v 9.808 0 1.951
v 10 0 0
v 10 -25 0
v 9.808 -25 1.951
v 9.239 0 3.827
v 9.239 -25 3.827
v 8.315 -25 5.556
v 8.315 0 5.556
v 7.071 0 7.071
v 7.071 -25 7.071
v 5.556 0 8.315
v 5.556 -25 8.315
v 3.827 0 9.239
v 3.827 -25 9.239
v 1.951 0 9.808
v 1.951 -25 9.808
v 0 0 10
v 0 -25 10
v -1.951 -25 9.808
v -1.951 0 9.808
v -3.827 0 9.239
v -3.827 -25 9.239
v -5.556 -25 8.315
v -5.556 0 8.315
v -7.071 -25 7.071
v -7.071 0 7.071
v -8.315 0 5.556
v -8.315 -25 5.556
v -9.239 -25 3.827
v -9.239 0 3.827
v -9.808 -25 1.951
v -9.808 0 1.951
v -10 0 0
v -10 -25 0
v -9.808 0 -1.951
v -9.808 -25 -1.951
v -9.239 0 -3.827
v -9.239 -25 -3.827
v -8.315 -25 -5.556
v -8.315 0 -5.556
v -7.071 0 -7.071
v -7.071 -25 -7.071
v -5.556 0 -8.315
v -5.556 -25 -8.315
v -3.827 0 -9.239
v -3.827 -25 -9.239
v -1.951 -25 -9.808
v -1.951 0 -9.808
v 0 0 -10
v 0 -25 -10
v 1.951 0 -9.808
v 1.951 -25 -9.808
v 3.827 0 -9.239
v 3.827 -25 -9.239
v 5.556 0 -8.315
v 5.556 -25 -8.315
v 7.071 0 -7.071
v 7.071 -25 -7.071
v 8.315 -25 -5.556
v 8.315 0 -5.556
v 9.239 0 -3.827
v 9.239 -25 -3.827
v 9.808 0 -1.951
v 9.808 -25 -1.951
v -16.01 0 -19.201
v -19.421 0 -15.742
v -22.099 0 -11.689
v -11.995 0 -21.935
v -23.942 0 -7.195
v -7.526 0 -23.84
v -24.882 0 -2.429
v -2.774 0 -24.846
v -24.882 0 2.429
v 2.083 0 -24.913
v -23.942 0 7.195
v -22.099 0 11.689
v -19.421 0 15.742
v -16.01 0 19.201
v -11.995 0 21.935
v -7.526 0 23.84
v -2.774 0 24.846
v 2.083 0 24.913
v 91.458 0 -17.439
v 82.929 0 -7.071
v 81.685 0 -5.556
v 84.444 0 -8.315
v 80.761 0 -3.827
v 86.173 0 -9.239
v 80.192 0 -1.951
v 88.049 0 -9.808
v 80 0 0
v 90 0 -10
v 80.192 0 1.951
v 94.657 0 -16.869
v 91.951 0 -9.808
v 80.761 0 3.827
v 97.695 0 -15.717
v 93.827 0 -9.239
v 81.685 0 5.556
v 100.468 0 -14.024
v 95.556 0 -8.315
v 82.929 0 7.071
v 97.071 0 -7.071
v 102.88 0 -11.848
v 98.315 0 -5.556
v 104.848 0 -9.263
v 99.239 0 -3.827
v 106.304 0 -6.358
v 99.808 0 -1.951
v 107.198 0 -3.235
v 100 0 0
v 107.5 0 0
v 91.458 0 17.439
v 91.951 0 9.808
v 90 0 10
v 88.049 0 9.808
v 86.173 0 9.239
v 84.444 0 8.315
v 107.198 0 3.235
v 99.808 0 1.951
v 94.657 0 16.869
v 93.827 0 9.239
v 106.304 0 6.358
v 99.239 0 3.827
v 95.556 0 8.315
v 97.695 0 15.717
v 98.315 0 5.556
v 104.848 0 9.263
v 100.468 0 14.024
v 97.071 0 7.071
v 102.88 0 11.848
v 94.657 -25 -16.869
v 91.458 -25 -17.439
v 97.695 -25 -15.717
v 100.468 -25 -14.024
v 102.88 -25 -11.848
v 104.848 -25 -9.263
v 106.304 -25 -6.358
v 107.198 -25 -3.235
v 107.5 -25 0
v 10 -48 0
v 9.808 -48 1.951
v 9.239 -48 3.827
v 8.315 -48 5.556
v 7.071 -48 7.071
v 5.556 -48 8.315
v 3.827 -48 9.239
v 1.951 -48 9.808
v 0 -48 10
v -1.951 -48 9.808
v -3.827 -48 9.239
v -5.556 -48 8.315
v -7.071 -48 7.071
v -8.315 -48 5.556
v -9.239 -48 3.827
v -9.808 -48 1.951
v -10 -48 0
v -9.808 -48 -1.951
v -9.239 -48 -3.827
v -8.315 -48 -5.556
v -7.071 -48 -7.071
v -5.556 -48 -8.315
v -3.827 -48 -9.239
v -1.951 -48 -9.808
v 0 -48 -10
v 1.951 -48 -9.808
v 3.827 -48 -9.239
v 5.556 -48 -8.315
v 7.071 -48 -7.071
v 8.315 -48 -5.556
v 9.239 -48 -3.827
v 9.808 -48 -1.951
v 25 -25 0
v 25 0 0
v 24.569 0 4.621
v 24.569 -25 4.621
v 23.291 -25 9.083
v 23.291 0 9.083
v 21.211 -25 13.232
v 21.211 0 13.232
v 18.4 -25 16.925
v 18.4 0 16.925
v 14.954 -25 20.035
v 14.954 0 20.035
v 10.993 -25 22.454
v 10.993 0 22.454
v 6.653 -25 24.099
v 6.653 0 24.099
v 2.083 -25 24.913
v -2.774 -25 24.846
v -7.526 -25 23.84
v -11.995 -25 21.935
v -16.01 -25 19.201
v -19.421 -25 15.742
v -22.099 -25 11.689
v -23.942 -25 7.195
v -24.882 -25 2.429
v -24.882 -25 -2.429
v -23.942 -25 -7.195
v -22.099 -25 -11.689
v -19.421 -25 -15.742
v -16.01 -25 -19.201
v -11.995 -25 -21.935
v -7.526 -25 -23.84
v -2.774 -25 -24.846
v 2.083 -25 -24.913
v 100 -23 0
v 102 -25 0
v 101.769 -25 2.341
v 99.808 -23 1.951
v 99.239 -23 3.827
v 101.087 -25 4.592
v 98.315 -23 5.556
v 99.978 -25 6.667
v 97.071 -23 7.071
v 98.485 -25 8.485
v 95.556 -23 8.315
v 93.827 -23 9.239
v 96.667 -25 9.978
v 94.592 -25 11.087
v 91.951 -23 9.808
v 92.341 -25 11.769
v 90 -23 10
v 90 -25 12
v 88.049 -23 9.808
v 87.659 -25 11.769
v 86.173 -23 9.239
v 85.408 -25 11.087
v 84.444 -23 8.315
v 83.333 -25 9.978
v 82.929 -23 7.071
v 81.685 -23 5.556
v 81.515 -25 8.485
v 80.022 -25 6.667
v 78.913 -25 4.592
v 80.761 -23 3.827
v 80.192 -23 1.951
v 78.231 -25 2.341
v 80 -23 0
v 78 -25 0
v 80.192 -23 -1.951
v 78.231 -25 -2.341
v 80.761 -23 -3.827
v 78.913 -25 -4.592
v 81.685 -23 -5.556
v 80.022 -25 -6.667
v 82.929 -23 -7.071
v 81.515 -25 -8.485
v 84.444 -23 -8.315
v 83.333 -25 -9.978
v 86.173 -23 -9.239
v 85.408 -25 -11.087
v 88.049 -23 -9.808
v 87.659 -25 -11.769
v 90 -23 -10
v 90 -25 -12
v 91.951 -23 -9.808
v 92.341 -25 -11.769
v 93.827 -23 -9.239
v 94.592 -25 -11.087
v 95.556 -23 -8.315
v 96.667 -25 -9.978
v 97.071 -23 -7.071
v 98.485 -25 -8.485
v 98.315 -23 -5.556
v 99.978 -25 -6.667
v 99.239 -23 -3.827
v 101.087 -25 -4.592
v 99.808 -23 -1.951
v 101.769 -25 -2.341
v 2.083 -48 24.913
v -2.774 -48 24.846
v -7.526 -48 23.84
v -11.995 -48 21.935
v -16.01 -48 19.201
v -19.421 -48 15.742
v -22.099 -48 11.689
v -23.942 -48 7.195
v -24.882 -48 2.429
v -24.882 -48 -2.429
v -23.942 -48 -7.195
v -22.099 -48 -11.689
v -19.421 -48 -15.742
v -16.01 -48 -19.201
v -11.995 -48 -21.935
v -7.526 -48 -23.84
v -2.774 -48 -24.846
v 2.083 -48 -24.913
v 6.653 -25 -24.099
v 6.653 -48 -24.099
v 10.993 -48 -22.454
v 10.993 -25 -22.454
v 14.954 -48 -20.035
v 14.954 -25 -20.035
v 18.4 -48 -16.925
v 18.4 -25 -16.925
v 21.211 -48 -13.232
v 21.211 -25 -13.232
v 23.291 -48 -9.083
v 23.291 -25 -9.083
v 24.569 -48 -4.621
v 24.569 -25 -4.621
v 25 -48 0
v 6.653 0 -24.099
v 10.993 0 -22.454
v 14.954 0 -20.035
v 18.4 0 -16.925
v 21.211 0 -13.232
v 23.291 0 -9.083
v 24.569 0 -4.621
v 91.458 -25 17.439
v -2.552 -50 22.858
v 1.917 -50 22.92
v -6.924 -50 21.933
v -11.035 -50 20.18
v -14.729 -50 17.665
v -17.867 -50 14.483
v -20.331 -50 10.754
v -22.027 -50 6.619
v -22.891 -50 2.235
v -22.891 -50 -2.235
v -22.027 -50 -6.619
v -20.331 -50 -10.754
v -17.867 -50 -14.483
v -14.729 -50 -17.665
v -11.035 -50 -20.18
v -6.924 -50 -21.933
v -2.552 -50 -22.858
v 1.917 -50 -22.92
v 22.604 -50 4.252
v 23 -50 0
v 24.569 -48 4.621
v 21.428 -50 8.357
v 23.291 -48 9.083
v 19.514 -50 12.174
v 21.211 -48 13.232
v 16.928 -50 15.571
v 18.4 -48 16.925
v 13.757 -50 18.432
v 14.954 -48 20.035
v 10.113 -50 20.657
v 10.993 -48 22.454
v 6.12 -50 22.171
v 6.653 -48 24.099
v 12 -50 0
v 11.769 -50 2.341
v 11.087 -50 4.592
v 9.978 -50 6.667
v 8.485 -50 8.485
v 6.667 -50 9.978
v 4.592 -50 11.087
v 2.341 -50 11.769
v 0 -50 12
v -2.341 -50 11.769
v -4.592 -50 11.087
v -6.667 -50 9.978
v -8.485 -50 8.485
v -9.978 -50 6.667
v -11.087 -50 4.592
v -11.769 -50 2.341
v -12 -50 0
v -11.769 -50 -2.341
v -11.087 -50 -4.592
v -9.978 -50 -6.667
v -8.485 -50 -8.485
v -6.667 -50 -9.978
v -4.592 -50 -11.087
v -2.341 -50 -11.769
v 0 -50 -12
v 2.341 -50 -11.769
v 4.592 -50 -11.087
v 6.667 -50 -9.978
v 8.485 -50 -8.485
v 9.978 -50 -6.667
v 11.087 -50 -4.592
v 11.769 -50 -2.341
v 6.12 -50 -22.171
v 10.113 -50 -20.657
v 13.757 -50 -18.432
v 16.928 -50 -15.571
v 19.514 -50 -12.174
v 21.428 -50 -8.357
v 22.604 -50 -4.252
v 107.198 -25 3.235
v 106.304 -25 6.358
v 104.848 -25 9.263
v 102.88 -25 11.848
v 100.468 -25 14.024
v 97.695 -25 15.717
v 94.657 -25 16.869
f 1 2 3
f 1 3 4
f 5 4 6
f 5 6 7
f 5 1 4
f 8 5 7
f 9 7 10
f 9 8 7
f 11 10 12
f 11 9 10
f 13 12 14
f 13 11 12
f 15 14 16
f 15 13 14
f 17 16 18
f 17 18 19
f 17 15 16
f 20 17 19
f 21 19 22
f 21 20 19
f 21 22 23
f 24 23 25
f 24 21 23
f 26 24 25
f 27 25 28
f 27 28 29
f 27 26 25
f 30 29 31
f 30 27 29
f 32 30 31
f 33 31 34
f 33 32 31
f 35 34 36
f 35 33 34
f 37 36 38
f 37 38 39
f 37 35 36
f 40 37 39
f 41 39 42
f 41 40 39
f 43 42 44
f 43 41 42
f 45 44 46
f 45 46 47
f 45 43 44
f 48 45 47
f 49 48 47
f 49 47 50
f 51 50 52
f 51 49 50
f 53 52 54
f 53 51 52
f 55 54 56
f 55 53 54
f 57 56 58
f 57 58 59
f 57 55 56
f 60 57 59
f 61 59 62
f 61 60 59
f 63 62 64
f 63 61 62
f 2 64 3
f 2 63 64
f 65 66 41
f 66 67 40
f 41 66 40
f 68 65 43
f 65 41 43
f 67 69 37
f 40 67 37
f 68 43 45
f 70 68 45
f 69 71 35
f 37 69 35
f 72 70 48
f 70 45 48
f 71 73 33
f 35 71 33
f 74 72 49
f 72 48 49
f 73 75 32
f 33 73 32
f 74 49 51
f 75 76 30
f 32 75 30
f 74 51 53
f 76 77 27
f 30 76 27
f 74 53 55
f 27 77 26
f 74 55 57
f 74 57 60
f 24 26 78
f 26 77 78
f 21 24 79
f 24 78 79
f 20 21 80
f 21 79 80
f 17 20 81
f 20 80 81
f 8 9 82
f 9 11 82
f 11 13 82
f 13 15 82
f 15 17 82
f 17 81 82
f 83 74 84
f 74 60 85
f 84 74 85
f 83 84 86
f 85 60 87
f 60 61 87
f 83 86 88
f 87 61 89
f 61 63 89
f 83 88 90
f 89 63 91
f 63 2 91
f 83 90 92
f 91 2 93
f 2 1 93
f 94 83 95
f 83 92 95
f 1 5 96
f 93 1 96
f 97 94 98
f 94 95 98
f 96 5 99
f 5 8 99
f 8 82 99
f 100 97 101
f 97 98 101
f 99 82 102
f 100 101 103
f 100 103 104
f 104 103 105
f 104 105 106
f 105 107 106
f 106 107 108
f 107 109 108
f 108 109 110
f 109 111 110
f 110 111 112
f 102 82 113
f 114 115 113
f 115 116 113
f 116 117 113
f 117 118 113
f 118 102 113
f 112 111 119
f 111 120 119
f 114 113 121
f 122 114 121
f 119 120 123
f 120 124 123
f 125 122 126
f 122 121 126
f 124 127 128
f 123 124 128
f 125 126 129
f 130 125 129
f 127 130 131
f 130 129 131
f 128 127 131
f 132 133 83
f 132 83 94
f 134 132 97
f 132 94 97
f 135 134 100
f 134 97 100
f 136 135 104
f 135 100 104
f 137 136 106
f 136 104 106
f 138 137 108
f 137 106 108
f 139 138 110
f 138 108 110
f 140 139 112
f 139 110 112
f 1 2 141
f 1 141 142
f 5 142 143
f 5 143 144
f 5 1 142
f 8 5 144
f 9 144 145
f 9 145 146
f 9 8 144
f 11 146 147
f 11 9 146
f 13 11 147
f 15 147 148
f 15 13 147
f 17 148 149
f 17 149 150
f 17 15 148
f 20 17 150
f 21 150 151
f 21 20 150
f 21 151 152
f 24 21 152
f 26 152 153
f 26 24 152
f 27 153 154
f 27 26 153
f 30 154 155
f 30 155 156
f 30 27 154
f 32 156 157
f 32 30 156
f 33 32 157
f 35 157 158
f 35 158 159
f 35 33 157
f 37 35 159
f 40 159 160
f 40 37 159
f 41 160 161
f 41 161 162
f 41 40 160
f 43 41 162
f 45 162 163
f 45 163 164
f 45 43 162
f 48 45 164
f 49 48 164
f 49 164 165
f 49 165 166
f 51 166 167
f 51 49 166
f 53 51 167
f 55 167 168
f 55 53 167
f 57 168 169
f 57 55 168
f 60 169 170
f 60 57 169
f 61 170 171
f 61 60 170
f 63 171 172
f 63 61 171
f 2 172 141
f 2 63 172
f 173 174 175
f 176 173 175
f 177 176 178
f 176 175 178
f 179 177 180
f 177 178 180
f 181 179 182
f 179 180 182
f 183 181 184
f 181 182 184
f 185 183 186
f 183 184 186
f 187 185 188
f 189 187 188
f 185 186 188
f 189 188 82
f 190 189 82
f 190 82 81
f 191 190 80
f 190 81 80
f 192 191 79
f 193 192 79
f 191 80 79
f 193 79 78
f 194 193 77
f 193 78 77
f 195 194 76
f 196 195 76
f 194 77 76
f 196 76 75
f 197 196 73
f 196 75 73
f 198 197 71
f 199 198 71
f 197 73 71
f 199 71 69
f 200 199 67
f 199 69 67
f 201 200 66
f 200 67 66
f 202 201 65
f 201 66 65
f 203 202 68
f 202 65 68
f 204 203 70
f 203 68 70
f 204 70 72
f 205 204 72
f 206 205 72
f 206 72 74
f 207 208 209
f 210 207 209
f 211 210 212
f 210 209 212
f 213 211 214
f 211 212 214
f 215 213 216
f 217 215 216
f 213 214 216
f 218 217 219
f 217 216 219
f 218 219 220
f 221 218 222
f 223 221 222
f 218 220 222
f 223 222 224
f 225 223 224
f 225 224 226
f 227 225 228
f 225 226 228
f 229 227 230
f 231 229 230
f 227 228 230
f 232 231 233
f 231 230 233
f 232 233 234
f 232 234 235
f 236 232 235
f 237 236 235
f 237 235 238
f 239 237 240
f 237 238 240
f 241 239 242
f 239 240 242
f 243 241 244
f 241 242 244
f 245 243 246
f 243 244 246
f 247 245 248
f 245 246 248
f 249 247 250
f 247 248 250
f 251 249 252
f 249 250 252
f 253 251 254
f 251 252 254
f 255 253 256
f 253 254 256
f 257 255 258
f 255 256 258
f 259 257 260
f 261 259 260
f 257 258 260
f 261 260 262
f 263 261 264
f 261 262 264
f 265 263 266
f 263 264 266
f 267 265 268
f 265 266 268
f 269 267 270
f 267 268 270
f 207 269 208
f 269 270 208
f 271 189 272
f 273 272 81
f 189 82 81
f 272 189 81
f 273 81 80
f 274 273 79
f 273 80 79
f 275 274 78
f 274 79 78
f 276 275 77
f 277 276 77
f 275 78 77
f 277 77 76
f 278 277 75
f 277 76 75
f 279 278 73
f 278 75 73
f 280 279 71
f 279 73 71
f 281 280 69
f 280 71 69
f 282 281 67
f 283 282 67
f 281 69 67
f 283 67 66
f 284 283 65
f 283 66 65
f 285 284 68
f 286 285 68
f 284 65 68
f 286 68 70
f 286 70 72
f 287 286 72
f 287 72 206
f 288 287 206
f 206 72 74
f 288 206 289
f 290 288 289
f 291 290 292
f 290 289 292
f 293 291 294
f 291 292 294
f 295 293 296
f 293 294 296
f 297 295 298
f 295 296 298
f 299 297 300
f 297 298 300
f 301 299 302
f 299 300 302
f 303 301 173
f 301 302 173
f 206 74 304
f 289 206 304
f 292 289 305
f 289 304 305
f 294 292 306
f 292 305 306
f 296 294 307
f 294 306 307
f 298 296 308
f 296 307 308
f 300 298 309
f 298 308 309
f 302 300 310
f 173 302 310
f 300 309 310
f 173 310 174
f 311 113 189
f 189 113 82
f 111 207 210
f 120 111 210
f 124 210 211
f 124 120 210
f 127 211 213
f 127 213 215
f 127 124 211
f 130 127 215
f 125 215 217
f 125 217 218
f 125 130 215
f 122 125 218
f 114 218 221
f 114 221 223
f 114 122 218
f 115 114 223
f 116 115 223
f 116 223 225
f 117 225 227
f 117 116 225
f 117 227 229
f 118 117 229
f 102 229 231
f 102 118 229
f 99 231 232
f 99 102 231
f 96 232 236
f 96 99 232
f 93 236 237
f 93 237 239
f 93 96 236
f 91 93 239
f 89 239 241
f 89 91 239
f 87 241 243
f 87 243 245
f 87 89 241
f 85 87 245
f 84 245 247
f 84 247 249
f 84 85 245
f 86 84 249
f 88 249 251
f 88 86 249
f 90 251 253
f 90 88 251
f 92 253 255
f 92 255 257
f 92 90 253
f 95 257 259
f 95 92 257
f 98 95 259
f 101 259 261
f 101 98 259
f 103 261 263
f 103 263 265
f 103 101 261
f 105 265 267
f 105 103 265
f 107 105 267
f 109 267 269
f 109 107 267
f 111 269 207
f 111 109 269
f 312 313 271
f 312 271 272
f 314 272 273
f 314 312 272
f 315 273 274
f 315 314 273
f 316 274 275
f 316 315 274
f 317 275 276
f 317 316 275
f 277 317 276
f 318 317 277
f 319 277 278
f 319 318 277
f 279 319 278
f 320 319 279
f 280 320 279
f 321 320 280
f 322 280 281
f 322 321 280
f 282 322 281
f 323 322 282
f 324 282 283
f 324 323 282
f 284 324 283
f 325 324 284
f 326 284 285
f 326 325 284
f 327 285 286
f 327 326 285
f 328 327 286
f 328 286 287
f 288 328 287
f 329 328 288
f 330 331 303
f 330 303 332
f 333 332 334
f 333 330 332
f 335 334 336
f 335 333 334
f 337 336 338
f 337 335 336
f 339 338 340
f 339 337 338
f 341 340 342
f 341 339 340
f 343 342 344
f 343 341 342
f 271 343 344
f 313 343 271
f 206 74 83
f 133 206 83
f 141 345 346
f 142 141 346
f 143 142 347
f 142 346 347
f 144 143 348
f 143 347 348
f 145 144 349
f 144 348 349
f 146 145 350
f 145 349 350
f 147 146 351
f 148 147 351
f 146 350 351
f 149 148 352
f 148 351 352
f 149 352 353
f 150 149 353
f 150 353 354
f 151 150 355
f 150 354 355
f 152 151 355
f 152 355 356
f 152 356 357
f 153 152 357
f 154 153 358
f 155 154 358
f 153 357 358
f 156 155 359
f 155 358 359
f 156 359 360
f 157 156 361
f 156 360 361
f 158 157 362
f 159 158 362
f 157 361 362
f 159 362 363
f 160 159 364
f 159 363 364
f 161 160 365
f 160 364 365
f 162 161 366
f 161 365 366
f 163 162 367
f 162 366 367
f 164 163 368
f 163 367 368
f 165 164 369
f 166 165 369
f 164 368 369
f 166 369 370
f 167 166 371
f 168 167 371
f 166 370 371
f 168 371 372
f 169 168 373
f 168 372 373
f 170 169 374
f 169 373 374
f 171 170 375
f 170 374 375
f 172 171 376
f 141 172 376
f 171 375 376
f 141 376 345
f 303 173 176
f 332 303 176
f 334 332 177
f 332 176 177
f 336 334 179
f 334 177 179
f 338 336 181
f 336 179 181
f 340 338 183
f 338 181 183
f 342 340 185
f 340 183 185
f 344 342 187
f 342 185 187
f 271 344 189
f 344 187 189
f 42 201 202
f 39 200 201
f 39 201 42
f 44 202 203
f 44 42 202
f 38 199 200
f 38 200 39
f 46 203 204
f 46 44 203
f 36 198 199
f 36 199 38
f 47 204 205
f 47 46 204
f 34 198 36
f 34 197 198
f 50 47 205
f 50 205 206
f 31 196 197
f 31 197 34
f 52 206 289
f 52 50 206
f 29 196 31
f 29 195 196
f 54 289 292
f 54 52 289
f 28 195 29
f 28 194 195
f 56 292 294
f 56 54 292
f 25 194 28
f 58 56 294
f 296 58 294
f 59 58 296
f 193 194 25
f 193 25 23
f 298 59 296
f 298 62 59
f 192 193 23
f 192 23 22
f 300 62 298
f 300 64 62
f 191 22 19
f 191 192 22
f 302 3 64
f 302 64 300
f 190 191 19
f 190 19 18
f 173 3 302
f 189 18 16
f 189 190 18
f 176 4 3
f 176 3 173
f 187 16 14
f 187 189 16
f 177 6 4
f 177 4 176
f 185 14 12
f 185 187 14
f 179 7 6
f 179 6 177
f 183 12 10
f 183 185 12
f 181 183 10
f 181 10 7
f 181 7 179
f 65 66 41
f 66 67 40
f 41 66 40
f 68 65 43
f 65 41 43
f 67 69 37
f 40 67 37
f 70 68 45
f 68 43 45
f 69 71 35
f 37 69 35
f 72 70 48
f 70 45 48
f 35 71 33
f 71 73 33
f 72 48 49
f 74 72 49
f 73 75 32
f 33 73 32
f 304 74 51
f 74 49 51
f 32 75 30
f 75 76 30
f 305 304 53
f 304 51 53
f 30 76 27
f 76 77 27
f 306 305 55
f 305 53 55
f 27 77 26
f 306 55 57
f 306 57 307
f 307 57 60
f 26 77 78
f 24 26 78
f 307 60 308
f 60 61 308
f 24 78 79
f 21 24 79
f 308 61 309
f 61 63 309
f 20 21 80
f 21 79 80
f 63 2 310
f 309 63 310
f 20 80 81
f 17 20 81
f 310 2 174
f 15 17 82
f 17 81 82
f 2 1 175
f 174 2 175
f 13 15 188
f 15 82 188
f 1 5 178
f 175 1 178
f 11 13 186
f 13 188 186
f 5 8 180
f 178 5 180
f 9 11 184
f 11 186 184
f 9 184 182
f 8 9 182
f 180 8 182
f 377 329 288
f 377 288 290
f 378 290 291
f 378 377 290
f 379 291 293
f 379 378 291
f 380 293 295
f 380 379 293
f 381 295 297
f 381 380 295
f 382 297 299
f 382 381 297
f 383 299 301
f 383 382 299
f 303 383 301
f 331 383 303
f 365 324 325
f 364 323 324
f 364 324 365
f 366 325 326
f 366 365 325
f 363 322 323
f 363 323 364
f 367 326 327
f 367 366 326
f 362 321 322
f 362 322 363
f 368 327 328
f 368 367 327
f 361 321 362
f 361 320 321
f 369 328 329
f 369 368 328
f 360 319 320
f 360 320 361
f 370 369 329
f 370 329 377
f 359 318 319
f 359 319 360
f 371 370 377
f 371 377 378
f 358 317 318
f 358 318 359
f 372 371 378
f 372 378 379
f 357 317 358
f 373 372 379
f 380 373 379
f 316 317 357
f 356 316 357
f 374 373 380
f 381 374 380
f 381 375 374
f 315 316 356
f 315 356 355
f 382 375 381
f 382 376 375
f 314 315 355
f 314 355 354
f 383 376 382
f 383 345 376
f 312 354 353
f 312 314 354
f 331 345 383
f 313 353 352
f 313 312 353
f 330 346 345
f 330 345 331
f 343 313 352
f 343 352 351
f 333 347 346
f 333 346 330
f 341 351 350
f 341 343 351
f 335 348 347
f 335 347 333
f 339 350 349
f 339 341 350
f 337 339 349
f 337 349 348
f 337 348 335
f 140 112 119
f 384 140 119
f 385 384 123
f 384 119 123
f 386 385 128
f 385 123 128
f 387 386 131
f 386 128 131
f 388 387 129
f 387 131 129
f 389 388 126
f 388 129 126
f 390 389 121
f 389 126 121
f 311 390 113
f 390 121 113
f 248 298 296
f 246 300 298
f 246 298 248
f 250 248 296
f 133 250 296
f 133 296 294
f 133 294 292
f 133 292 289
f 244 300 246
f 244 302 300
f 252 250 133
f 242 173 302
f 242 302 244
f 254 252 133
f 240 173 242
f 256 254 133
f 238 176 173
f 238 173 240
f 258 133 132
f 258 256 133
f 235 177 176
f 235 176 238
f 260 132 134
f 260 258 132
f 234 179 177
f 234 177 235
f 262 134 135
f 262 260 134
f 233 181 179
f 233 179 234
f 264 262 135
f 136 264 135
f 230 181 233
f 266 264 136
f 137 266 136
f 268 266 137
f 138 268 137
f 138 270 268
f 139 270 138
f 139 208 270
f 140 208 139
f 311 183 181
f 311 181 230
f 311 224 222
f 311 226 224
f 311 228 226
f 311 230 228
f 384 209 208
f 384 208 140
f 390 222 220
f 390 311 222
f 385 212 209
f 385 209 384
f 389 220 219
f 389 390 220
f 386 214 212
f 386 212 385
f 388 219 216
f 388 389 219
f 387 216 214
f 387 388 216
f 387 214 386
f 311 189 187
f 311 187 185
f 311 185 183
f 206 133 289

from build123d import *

# Parameters (mm, degrees)
F0_R     = 10
F1_DEPTH = 25
F2_DEPTH = 50
F3_SIZE  = 2
F4_DEPTH = 25


with BuildPart() as f1:
    # F0 (on Front) → F1 (new body)
    with BuildSketch(Plane.XZ):
        with BuildLine():
            ThreePointArc((2.083333, -24.913043), (18.399502, -16.92508), (25, 0))
            ThreePointArc((25, 0), (18.399502, 16.92508), (2.083333, 24.913043))
            ThreePointArc((2.083333, 24.913043), (-25, 0), (2.083333, -24.913043))
        make_face()
        Circle(F0_R, mode=Mode.SUBTRACT)
        with BuildLine():
            ThreePointArc((2.083333, 24.913043), (18.399502, 16.92508), (25, 0))
            ThreePointArc((25, 0), (18.399502, -16.92508), (2.083333, -24.913043))
            Line((2.083333, -24.913043), (91.458333, -17.43913))
            ThreePointArc((91.458333, -17.43913), (72.5, 0), (91.458333, 17.43913))
            Line((91.458333, 17.43913), (2.083333, 24.913043))
        make_face()
        with BuildLine():
            ThreePointArc((107.5, 0), (102.879651, 11.847556), (91.458333, 17.43913))
            ThreePointArc((91.458333, 17.43913), (72.5, 0), (91.458333, -17.43913))
            ThreePointArc((91.458333, -17.43913), (102.879651, -11.847556), (107.5, 0))
        make_face()
        with Locations((90, 0)):
            Circle(F0_R, mode=Mode.SUBTRACT)
    extrude(amount=F1_DEPTH)

    # F0 (on Front) → F2 (join)
    with BuildSketch(Plane.XZ):
        with BuildLine():
            ThreePointArc((2.083333, -24.913043), (18.399502, -16.92508), (25, 0))
            ThreePointArc((25, 0), (18.399502, 16.92508), (2.083333, 24.913043))
            ThreePointArc((2.083333, 24.913043), (-25, 0), (2.083333, -24.913043))
        make_face()
        Circle(F0_R, mode=Mode.SUBTRACT)
    extrude(amount=F2_DEPTH)

    # F3
    f3_edges = [f1.edges().sort_by_distance(p)[0] for p in [
        (-2.083333, -50, 24.913043),
        (-10, -50, 0),
        (80, -25, 0),
    ]]
    chamfer(f3_edges, length=F3_SIZE)


with BuildPart() as f4:
    # F0 (on Front) → F4 (new body)
    with BuildSketch(Plane.XZ):
        with BuildLine():
            ThreePointArc((2.083333, -24.913043), (18.399502, -16.92508), (25, 0))
            ThreePointArc((25, 0), (18.399502, 16.92508), (2.083333, 24.913043))
            ThreePointArc((2.083333, 24.913043), (-25, 0), (2.083333, -24.913043))
        make_face()
        Circle(F0_R, mode=Mode.SUBTRACT)
    extrude(amount=F4_DEPTH)


solid = Compound([f1.part, f4.part])
